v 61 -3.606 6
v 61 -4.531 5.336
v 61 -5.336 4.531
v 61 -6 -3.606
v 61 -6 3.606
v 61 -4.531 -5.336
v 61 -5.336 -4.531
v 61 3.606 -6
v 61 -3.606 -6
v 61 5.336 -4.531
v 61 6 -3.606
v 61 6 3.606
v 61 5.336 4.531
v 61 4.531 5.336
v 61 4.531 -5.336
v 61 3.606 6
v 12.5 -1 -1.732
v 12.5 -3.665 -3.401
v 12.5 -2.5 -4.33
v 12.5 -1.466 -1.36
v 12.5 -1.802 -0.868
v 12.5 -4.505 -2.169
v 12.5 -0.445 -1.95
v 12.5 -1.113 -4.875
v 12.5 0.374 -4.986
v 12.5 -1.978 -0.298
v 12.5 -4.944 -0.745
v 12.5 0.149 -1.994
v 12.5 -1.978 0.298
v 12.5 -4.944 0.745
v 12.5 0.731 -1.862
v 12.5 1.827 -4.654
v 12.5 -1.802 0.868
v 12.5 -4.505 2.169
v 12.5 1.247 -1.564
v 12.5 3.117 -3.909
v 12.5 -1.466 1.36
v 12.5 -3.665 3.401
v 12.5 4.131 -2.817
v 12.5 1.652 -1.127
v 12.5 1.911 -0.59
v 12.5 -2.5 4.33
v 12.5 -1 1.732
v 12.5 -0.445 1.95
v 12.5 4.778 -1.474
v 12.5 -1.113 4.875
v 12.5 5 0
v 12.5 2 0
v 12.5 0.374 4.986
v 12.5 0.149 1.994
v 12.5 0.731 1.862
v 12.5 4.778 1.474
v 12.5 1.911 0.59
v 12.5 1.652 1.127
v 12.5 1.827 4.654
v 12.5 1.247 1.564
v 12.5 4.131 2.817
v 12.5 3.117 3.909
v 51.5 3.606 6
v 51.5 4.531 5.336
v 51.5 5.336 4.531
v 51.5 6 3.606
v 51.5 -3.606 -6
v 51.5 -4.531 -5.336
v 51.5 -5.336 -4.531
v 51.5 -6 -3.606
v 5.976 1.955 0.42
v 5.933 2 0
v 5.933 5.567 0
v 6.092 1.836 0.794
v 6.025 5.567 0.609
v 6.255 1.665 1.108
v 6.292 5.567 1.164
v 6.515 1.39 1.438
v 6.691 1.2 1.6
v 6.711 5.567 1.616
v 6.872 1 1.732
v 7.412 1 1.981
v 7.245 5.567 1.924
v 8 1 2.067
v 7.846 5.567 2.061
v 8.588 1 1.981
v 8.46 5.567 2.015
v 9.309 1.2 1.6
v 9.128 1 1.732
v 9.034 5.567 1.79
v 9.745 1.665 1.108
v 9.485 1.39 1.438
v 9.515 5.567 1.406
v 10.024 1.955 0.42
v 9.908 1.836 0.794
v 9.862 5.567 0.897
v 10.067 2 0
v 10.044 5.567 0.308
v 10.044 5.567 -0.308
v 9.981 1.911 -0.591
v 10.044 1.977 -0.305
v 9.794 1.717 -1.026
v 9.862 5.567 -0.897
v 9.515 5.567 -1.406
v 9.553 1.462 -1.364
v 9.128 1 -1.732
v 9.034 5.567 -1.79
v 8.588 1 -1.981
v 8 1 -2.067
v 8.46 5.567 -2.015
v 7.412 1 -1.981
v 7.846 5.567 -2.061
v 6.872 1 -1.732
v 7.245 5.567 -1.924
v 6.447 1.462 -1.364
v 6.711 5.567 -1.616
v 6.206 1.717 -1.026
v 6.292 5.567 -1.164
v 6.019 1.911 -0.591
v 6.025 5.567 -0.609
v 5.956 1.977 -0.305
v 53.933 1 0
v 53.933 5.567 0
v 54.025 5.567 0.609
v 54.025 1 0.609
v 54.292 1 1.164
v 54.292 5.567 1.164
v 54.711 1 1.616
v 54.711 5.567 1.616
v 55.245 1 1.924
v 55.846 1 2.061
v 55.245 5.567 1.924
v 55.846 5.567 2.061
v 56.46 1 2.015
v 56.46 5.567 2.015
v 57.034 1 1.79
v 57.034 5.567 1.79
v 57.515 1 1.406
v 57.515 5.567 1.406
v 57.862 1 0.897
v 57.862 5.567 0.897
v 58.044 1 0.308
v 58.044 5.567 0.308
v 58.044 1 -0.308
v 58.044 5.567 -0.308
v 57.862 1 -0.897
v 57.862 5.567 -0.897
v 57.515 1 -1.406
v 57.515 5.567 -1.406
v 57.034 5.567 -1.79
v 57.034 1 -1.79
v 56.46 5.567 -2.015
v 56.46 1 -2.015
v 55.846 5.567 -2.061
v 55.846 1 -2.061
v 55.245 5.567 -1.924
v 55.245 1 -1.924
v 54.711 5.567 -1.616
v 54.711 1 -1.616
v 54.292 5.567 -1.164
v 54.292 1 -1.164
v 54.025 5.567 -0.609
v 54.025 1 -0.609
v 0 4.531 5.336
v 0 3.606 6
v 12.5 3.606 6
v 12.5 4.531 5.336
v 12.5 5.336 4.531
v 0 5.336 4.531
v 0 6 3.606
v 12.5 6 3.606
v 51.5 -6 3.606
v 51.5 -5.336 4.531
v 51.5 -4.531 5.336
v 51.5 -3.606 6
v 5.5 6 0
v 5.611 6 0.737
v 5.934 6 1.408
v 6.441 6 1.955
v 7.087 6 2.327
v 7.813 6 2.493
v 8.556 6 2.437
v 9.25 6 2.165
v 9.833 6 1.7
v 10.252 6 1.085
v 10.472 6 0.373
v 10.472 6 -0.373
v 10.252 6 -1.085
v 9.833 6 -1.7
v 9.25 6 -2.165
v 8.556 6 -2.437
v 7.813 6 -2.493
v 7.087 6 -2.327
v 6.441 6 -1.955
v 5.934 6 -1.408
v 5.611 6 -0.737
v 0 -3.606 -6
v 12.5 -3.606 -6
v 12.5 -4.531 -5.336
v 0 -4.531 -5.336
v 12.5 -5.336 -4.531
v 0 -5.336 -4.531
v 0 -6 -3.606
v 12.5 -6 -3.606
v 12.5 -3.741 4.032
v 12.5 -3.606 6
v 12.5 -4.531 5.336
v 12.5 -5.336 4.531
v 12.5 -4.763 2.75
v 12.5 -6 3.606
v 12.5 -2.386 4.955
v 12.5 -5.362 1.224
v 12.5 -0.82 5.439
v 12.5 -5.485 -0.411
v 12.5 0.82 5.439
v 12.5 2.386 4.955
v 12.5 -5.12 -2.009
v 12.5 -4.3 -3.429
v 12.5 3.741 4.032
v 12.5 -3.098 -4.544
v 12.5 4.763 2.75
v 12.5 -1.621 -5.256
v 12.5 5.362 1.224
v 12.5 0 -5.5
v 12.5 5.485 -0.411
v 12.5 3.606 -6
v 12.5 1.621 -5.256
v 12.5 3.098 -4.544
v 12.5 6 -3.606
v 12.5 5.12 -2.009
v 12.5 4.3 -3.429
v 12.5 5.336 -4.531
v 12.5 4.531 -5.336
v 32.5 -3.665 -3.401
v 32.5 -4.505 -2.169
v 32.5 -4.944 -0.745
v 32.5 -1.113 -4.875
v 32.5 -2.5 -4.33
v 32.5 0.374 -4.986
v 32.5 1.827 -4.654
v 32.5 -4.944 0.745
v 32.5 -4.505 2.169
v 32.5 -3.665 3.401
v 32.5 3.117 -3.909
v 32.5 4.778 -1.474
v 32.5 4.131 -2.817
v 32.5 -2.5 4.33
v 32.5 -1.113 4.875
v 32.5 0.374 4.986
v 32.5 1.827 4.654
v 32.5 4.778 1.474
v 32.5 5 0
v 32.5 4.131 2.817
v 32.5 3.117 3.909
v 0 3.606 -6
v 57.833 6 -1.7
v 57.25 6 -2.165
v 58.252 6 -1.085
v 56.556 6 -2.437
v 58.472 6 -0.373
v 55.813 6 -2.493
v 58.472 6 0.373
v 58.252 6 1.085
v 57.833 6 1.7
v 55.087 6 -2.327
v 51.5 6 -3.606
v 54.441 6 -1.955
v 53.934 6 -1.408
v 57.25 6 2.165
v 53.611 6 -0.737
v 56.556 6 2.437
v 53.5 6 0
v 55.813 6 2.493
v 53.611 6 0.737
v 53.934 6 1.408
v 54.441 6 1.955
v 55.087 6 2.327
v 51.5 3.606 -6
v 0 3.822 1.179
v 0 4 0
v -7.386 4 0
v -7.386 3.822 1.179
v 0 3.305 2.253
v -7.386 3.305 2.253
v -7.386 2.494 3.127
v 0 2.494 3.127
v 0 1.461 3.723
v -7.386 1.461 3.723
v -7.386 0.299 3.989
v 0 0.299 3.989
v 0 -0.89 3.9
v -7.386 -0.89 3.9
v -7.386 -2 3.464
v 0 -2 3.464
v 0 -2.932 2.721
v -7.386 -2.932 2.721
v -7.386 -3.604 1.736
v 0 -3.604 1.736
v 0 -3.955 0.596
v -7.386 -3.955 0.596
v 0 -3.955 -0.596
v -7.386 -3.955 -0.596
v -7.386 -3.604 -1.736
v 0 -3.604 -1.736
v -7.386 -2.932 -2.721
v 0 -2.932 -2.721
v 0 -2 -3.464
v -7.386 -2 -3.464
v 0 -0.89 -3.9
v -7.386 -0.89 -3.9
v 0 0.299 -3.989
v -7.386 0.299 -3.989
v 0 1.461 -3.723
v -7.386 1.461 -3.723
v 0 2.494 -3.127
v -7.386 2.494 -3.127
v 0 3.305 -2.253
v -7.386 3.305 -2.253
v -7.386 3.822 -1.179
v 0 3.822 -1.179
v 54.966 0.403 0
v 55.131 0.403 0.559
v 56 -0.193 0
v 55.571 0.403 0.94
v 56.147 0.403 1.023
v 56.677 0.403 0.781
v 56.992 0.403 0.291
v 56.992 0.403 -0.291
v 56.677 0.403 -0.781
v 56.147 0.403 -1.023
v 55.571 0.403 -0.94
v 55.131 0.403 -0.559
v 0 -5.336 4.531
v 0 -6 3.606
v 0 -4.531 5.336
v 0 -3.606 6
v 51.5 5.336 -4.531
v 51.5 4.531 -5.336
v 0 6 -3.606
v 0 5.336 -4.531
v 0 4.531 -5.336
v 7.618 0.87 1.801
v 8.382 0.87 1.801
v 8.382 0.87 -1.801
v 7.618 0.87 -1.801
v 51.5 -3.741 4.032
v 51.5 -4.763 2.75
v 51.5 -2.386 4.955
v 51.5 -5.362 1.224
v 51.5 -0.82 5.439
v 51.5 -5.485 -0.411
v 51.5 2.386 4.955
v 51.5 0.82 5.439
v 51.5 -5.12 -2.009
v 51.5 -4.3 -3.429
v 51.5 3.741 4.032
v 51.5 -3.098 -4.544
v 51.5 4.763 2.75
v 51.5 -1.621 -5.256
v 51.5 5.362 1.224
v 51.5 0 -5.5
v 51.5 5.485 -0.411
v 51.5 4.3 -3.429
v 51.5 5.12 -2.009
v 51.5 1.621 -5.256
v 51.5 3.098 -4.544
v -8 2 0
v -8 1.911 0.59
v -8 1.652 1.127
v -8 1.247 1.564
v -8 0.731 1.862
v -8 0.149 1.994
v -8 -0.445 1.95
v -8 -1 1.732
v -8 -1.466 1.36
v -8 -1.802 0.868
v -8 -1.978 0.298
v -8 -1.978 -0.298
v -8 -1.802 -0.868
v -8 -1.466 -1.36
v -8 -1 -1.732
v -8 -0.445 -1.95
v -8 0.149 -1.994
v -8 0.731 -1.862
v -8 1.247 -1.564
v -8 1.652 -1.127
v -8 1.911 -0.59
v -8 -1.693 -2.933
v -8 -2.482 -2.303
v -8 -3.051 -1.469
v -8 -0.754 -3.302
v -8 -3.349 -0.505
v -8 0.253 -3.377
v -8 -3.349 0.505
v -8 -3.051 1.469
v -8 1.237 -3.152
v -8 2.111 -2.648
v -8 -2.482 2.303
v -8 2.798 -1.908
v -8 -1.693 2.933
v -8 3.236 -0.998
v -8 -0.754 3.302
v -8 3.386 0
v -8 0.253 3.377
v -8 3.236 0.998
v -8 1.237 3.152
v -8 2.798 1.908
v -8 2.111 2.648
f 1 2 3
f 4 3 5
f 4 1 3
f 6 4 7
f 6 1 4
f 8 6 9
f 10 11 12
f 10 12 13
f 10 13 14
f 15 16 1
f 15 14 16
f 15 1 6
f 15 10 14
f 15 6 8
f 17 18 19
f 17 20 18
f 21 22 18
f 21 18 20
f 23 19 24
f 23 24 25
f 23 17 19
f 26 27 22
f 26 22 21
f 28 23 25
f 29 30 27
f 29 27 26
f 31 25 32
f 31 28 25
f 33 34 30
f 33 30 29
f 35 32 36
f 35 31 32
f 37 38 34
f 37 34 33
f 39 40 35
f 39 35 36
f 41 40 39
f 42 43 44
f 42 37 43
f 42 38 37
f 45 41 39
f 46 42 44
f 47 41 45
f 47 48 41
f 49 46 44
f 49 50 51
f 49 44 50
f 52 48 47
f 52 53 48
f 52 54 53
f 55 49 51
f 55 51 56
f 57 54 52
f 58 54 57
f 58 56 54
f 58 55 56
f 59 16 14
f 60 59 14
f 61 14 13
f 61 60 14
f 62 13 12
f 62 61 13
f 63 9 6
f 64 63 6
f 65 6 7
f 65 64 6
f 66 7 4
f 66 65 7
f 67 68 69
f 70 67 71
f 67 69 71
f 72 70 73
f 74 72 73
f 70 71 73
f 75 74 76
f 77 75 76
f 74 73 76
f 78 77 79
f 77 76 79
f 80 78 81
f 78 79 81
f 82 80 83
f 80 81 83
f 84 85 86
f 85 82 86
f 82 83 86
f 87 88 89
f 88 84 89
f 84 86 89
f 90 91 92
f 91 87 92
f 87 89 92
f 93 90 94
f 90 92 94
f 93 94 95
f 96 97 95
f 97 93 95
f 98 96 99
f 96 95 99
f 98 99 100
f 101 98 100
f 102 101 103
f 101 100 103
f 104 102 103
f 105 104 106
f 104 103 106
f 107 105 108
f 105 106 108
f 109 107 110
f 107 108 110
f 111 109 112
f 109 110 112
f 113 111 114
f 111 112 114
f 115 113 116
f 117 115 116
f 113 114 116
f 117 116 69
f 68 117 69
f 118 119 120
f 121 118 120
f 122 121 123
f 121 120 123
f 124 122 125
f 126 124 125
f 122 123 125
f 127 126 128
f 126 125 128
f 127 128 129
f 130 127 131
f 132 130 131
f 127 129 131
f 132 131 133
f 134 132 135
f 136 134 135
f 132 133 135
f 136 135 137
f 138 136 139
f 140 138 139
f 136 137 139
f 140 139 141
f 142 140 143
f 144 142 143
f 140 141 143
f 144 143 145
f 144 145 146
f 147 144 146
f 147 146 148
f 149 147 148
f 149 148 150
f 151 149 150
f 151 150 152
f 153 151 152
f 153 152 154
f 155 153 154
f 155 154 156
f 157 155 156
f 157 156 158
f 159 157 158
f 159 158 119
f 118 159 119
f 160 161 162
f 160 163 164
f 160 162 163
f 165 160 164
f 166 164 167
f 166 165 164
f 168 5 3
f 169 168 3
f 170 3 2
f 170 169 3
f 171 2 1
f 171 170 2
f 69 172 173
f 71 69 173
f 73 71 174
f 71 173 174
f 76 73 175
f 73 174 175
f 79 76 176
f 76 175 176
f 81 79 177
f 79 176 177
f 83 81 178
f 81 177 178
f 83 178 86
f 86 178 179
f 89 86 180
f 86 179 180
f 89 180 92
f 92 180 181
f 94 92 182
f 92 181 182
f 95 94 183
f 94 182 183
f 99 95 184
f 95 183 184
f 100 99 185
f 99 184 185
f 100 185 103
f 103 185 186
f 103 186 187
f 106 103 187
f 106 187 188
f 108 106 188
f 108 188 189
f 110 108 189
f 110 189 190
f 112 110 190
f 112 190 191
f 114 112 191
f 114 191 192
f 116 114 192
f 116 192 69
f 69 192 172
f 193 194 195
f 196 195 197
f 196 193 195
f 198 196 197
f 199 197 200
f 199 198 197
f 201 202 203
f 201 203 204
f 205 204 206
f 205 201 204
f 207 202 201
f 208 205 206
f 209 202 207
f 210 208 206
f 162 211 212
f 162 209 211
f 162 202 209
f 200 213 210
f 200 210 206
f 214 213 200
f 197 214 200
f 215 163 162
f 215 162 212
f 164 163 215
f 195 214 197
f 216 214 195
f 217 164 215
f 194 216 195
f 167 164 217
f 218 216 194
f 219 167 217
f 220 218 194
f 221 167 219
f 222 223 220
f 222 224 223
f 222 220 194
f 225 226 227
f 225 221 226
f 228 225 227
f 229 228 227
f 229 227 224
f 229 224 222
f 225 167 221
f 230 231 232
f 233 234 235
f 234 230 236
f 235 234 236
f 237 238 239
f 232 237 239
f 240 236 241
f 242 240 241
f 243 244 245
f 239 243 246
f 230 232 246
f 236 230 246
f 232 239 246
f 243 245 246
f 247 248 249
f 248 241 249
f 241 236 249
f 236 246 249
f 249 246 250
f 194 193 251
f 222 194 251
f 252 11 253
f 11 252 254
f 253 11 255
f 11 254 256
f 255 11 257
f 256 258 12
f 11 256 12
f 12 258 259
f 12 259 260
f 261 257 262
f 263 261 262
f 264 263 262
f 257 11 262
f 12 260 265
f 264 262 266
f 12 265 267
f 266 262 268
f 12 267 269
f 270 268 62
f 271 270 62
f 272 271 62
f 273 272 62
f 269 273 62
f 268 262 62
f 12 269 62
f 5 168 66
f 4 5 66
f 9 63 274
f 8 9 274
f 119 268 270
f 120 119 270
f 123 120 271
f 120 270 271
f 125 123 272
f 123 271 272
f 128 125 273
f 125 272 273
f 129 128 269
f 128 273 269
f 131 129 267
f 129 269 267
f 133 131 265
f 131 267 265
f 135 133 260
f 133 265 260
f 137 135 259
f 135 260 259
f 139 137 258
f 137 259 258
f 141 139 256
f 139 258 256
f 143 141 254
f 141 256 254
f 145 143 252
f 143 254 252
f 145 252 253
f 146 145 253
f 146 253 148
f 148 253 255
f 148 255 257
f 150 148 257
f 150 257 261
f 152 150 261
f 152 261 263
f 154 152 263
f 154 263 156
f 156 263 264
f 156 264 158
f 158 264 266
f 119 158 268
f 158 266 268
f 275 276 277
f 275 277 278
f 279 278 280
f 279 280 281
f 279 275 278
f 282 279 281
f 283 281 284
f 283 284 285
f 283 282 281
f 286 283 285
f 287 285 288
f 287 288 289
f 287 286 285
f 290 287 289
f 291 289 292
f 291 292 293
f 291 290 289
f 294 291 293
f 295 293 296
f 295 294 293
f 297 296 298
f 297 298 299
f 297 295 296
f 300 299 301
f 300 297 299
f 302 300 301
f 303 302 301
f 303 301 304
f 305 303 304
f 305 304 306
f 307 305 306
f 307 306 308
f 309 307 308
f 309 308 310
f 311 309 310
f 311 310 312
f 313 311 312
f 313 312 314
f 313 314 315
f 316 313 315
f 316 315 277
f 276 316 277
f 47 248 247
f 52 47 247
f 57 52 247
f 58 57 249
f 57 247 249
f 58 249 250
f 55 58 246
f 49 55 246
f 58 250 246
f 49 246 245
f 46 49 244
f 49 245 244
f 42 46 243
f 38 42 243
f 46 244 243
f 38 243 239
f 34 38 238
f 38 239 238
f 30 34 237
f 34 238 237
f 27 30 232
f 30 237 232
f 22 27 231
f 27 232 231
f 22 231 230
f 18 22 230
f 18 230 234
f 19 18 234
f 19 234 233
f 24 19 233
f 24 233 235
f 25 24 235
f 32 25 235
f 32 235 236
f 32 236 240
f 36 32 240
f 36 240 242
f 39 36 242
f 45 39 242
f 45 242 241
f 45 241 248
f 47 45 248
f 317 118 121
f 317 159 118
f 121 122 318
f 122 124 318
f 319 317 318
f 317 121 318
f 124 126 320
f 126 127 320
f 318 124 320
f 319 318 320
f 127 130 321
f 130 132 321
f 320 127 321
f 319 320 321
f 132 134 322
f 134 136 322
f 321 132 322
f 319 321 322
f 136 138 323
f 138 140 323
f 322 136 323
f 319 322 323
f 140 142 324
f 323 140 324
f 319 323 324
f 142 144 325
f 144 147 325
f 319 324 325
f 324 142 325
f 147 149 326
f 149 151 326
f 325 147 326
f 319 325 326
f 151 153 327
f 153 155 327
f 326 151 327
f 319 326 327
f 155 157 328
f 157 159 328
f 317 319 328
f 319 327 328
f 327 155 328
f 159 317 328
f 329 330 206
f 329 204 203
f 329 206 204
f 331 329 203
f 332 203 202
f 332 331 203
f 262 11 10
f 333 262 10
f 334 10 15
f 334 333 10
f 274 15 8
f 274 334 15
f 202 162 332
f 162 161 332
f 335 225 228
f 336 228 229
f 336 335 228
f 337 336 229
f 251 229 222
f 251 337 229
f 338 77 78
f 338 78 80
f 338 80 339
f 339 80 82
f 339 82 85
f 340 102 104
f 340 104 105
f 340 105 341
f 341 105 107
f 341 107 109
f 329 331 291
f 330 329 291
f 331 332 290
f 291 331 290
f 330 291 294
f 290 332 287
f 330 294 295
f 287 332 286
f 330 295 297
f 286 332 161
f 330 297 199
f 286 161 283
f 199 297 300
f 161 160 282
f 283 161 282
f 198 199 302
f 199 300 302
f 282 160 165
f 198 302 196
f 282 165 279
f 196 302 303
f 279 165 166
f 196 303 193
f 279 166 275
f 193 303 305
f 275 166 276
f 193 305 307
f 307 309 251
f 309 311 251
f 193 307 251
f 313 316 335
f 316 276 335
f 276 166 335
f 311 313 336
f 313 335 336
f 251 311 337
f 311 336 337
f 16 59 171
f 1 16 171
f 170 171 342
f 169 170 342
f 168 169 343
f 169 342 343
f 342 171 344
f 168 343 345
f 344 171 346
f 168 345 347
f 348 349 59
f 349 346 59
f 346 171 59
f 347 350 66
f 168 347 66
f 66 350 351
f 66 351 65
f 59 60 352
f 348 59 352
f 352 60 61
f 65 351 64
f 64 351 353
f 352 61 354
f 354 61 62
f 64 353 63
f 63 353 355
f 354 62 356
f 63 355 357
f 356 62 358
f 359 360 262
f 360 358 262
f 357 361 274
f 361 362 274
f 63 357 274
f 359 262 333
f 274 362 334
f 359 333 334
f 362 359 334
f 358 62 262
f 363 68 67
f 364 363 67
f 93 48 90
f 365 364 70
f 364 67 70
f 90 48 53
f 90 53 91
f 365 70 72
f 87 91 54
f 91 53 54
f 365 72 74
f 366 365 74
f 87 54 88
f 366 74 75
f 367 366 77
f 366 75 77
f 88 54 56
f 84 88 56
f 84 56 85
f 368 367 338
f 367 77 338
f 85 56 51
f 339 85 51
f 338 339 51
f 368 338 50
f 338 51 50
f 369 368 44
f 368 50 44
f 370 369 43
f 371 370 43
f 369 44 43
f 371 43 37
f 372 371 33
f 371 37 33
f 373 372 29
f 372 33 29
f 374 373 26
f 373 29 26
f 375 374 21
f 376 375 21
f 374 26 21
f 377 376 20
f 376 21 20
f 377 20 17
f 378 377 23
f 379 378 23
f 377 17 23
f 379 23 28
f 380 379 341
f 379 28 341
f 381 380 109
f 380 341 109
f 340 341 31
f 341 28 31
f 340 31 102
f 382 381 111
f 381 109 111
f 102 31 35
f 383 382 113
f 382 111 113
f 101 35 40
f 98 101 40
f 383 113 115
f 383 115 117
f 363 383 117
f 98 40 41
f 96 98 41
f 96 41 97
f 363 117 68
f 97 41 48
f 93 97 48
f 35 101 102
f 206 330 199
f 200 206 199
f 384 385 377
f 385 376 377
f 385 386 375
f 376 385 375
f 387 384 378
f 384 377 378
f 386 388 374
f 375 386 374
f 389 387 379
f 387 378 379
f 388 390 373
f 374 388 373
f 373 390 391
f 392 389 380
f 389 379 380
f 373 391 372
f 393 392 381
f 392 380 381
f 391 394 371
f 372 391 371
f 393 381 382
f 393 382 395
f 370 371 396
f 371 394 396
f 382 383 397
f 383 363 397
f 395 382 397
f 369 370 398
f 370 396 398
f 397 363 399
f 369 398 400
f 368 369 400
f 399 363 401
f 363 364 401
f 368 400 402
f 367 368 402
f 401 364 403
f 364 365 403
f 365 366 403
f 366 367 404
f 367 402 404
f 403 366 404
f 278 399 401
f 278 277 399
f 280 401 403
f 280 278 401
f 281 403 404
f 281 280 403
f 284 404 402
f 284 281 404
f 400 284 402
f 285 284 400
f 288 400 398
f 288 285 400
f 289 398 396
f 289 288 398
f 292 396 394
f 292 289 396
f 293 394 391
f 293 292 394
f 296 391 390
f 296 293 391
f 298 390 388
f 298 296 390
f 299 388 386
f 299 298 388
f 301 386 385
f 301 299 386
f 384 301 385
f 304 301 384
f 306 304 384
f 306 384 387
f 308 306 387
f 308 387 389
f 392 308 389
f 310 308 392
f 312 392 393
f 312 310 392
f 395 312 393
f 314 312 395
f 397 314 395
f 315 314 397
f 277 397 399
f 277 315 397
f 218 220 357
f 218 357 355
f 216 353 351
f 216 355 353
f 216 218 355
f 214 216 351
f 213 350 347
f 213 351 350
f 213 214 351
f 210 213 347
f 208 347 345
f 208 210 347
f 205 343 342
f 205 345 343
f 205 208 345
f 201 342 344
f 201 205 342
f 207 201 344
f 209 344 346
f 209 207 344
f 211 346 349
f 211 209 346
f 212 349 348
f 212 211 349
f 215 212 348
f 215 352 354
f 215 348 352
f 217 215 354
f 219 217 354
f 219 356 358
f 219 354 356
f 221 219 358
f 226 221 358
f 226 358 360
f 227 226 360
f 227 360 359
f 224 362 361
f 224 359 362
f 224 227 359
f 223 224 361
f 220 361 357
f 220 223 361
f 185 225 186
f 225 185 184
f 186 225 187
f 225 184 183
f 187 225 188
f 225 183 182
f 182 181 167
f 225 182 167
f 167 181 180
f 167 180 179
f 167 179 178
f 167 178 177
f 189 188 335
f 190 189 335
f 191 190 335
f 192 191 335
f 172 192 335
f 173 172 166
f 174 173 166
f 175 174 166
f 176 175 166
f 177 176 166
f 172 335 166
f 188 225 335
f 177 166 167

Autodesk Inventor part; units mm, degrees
sketch "Sketch_8" plane through (0, 0, 0) normal (0, 0, 1) x (1, 0, 0)
  line L0 (0, 0) -> (-8, 0)
  line L1 (-8, 0) -> (-8, 3.3865)
  line L2 (-8, 3.3865) -> (-7.3865, 4)
  line L3 (-7.3865, 4) -> (0, 4)
  line L4 (0, 4) -> (0, 0)
  line L5 (0, 0) -> (-8, 0)
revolve "Revolution1" add sketch "Sketch_8" angle 360 about axis through (0, 0, 0) along (1, 0, 0)
thread "Thread1" size "M8x1" class "6g" standard "ISO Metric profile" length 5.8865
sketch "Sketch_9" plane through (0, 0, 0) normal (1, 0, 0) x (0, 0, -1)
  line L0 (-6, 3.6056) -> (-6, -3.6056)
  arc A0 (-6, -3.6056) -> (-3.6056, -6) centre (0, 0) ccw
  line L1 (-3.6056, -6) -> (3.6056, -6)
  arc A1 (3.6056, -6) -> (6, -3.6056) centre (0, 0) ccw
  line L2 (6, -3.6056) -> (6, 3.6056)
  arc A2 (6, 3.6056) -> (3.6056, 6) centre (0, 0) ccw
  line L3 (3.6056, 6) -> (-3.6056, 6)
  arc A3 (-3.6056, 6) -> (-6, 3.6056) centre (0, 0) ccw
extrude "Extrusion1" add sketch "Sketch_9" along normal blind 12.5
sketch "Sketch_6" plane through (12.5, 0, 0) normal (1, 0, 0) x (0, 0, -1)
  circle A0 centre (0, 0) radius 5.5
extrude "Extrusion2" add sketch "Sketch_6" along normal blind 39
sketch "Sketch_10" plane through (51.5, 0, 0) normal (1, 0, 0) x (0, 0, -1)
  line L0 (-6, 3.6056) -> (-6, -3.6056)
  arc A0 (-6, -3.6056) -> (-3.6056, -6) centre (0, 0) ccw
  line L1 (-3.6056, -6) -> (3.6056, -6)
  arc A1 (3.6056, -6) -> (6, -3.6056) centre (0, 0) ccw
  line L2 (6, -3.6056) -> (6, 3.6056)
  arc A2 (6, 3.6056) -> (3.6056, 6) centre (0, 0) ccw
  line L3 (3.6056, 6) -> (-3.6056, 6)
  arc A3 (-3.6056, 6) -> (-6, 3.6056) centre (0, 0) ccw
extrude "Extrusion3" add sketch "Sketch_10" along normal blind 9.5
sketch "Sketch7_ALT_Drilling_1" plane through (0, 0, 0) normal (0, 0, 1) x (1, 0, 0)
  line L0 (8, 6) -> (8, 1)
  line L1 (8, -0.1934) -> (5.933, 1)
  line L2 (5.933, 1) -> (5.933, 5.567)
  line L3 (5.933, 5.567) -> (5.5, 6)
  line L4 (5.5, 6) -> (8, 6)
  line L5 (8, 6) -> (8, -0.1934)
revolve "Revolution2" cut sketch "Sketch7_ALT_Drilling_1" angle 360 about axis through (8, 6, 0) along (0, 1, 0)
thread "Thread2" size "M5x0.8" class "6H" standard "ISO Metric profile" full length
sketch "Sketch_7_ALT_Drilling_2" plane through (0, 0, 0) normal (0, 0, 1) x (1, 0, 0)
  line L0 (56, 6) -> (56, 1)
  line L1 (56, -0.1934) -> (53.933, 1)
  line L2 (53.933, 1) -> (53.933, 5.567)
  line L3 (53.933, 5.567) -> (53.5, 6)
  line L4 (53.5, 6) -> (56, 6)
  line L5 (56, 6) -> (56, -0.1934)
revolve "Revolution3" cut sketch "Sketch_7_ALT_Drilling_2" angle 360 about axis through (56, 6, 0) along (0, 1, 0)
thread "Thread3" size "M5x0.8" class "6H" standard "ISO Metric profile" full length
sketch "Sketch_16_ALT_Drilling_3" plane through (0, 0, 0) normal (0, 0, 1) x (1, 0, 0)
  line L0 (32.5, 0) -> (-8, 0)
  line L1 (-8, 0) -> (-8, 2)
  line L2 (-8, 2) -> (12.5, 2)
  line L3 (12.5, 2) -> (12.5, 5)
  line L4 (12.5, 5) -> (32.5, 5)
  line L5 (32.5, 5) -> (32.5, 0)
  line L6 (32.5, 0) -> (-8, 0)
revolve "Revolution4" cut sketch "Sketch_16_ALT_Drilling_3" angle 360 about axis through (32.5, 0, 0) along (1, 0, 0)
ref_plane "BODY_N_XY" through (61, 0, 0) normal (0, 0, -1) x (1, 0, 0)
ref_plane "BODY_N_YZ" through (61, 0, 0) normal (1, 0, 0) x (0, -1, 0)
ref_plane "BODY_N_ZX" through (61, 0, 0) normal (0, -1, 0) x (0, 0, -1)
ref_plane "NUT2_XY" through (61, 0, 0) normal (1, 0, 0) x (0, 0, -1)
ref_plane "NUT2_YZ" through (61, 0, 0) normal (0, 0, -1) x (0, 1, 0)
ref_plane "NUT2_ZX" through (61, 0, 0) normal (0, 1, 0) x (1, 0, 0)
ref_plane "SW1_XY" through (17, 0, 0) normal (1, 0, 0) x (0, 0, -1)
ref_plane "SW1_YZ" through (17, 0, 0) normal (0, 0, -1) x (0, 1, 0)
ref_plane "SW1_ZX" through (17, 0, 0) normal (0, 1, 0) x (1, 0, 0)
ref_plane "SW2_XY" through (47, 0, 0) normal (-1, 0, 0) x (0, 0, -1)
ref_plane "SW2_YZ" through (47, 0, 0) normal (0, 0, -1) x (0, -1, 0)
ref_plane "SW2_ZX" through (47, 0, 0) normal (0, -1, 0) x (-1, 0, 0)
ref_plane "SW_R1_XY" through (17, -11, 0) normal (1, 0, 0) x (0, 0, -1)
ref_plane "SW_R1_YZ" through (17, -11, 0) normal (0, 0, -1) x (0, 1, 0)
ref_plane "SW_R1_ZX" through (17, -11, 0) normal (0, 1, 0) x (1, 0, 0)
ref_plane "SW_R2_XY" through (47, -11, 0) normal (-1, 0, 0) x (0, 0, -1)
ref_plane "SW_R2_YZ" through (47, -11, 0) normal (0, 0, -1) x (0, -1, 0)
ref_plane "SW_R2_ZX" through (47, -11, 0) normal (0, -1, 0) x (-1, 0, 0)
ref_plane "body_XY" through (0, 0, 0) normal (1, 0, 0) x (0, 0, -1)
ref_plane "body_YZ" through (0, 0, 0) normal (0, 0, -1) x (0, 1, 0)
ref_plane "body_ZX" through (0, 0, 0) normal (0, 1, 0) x (1, 0, 0)
properties part number "CJ2B10-15Z(0_0)_BODY"
